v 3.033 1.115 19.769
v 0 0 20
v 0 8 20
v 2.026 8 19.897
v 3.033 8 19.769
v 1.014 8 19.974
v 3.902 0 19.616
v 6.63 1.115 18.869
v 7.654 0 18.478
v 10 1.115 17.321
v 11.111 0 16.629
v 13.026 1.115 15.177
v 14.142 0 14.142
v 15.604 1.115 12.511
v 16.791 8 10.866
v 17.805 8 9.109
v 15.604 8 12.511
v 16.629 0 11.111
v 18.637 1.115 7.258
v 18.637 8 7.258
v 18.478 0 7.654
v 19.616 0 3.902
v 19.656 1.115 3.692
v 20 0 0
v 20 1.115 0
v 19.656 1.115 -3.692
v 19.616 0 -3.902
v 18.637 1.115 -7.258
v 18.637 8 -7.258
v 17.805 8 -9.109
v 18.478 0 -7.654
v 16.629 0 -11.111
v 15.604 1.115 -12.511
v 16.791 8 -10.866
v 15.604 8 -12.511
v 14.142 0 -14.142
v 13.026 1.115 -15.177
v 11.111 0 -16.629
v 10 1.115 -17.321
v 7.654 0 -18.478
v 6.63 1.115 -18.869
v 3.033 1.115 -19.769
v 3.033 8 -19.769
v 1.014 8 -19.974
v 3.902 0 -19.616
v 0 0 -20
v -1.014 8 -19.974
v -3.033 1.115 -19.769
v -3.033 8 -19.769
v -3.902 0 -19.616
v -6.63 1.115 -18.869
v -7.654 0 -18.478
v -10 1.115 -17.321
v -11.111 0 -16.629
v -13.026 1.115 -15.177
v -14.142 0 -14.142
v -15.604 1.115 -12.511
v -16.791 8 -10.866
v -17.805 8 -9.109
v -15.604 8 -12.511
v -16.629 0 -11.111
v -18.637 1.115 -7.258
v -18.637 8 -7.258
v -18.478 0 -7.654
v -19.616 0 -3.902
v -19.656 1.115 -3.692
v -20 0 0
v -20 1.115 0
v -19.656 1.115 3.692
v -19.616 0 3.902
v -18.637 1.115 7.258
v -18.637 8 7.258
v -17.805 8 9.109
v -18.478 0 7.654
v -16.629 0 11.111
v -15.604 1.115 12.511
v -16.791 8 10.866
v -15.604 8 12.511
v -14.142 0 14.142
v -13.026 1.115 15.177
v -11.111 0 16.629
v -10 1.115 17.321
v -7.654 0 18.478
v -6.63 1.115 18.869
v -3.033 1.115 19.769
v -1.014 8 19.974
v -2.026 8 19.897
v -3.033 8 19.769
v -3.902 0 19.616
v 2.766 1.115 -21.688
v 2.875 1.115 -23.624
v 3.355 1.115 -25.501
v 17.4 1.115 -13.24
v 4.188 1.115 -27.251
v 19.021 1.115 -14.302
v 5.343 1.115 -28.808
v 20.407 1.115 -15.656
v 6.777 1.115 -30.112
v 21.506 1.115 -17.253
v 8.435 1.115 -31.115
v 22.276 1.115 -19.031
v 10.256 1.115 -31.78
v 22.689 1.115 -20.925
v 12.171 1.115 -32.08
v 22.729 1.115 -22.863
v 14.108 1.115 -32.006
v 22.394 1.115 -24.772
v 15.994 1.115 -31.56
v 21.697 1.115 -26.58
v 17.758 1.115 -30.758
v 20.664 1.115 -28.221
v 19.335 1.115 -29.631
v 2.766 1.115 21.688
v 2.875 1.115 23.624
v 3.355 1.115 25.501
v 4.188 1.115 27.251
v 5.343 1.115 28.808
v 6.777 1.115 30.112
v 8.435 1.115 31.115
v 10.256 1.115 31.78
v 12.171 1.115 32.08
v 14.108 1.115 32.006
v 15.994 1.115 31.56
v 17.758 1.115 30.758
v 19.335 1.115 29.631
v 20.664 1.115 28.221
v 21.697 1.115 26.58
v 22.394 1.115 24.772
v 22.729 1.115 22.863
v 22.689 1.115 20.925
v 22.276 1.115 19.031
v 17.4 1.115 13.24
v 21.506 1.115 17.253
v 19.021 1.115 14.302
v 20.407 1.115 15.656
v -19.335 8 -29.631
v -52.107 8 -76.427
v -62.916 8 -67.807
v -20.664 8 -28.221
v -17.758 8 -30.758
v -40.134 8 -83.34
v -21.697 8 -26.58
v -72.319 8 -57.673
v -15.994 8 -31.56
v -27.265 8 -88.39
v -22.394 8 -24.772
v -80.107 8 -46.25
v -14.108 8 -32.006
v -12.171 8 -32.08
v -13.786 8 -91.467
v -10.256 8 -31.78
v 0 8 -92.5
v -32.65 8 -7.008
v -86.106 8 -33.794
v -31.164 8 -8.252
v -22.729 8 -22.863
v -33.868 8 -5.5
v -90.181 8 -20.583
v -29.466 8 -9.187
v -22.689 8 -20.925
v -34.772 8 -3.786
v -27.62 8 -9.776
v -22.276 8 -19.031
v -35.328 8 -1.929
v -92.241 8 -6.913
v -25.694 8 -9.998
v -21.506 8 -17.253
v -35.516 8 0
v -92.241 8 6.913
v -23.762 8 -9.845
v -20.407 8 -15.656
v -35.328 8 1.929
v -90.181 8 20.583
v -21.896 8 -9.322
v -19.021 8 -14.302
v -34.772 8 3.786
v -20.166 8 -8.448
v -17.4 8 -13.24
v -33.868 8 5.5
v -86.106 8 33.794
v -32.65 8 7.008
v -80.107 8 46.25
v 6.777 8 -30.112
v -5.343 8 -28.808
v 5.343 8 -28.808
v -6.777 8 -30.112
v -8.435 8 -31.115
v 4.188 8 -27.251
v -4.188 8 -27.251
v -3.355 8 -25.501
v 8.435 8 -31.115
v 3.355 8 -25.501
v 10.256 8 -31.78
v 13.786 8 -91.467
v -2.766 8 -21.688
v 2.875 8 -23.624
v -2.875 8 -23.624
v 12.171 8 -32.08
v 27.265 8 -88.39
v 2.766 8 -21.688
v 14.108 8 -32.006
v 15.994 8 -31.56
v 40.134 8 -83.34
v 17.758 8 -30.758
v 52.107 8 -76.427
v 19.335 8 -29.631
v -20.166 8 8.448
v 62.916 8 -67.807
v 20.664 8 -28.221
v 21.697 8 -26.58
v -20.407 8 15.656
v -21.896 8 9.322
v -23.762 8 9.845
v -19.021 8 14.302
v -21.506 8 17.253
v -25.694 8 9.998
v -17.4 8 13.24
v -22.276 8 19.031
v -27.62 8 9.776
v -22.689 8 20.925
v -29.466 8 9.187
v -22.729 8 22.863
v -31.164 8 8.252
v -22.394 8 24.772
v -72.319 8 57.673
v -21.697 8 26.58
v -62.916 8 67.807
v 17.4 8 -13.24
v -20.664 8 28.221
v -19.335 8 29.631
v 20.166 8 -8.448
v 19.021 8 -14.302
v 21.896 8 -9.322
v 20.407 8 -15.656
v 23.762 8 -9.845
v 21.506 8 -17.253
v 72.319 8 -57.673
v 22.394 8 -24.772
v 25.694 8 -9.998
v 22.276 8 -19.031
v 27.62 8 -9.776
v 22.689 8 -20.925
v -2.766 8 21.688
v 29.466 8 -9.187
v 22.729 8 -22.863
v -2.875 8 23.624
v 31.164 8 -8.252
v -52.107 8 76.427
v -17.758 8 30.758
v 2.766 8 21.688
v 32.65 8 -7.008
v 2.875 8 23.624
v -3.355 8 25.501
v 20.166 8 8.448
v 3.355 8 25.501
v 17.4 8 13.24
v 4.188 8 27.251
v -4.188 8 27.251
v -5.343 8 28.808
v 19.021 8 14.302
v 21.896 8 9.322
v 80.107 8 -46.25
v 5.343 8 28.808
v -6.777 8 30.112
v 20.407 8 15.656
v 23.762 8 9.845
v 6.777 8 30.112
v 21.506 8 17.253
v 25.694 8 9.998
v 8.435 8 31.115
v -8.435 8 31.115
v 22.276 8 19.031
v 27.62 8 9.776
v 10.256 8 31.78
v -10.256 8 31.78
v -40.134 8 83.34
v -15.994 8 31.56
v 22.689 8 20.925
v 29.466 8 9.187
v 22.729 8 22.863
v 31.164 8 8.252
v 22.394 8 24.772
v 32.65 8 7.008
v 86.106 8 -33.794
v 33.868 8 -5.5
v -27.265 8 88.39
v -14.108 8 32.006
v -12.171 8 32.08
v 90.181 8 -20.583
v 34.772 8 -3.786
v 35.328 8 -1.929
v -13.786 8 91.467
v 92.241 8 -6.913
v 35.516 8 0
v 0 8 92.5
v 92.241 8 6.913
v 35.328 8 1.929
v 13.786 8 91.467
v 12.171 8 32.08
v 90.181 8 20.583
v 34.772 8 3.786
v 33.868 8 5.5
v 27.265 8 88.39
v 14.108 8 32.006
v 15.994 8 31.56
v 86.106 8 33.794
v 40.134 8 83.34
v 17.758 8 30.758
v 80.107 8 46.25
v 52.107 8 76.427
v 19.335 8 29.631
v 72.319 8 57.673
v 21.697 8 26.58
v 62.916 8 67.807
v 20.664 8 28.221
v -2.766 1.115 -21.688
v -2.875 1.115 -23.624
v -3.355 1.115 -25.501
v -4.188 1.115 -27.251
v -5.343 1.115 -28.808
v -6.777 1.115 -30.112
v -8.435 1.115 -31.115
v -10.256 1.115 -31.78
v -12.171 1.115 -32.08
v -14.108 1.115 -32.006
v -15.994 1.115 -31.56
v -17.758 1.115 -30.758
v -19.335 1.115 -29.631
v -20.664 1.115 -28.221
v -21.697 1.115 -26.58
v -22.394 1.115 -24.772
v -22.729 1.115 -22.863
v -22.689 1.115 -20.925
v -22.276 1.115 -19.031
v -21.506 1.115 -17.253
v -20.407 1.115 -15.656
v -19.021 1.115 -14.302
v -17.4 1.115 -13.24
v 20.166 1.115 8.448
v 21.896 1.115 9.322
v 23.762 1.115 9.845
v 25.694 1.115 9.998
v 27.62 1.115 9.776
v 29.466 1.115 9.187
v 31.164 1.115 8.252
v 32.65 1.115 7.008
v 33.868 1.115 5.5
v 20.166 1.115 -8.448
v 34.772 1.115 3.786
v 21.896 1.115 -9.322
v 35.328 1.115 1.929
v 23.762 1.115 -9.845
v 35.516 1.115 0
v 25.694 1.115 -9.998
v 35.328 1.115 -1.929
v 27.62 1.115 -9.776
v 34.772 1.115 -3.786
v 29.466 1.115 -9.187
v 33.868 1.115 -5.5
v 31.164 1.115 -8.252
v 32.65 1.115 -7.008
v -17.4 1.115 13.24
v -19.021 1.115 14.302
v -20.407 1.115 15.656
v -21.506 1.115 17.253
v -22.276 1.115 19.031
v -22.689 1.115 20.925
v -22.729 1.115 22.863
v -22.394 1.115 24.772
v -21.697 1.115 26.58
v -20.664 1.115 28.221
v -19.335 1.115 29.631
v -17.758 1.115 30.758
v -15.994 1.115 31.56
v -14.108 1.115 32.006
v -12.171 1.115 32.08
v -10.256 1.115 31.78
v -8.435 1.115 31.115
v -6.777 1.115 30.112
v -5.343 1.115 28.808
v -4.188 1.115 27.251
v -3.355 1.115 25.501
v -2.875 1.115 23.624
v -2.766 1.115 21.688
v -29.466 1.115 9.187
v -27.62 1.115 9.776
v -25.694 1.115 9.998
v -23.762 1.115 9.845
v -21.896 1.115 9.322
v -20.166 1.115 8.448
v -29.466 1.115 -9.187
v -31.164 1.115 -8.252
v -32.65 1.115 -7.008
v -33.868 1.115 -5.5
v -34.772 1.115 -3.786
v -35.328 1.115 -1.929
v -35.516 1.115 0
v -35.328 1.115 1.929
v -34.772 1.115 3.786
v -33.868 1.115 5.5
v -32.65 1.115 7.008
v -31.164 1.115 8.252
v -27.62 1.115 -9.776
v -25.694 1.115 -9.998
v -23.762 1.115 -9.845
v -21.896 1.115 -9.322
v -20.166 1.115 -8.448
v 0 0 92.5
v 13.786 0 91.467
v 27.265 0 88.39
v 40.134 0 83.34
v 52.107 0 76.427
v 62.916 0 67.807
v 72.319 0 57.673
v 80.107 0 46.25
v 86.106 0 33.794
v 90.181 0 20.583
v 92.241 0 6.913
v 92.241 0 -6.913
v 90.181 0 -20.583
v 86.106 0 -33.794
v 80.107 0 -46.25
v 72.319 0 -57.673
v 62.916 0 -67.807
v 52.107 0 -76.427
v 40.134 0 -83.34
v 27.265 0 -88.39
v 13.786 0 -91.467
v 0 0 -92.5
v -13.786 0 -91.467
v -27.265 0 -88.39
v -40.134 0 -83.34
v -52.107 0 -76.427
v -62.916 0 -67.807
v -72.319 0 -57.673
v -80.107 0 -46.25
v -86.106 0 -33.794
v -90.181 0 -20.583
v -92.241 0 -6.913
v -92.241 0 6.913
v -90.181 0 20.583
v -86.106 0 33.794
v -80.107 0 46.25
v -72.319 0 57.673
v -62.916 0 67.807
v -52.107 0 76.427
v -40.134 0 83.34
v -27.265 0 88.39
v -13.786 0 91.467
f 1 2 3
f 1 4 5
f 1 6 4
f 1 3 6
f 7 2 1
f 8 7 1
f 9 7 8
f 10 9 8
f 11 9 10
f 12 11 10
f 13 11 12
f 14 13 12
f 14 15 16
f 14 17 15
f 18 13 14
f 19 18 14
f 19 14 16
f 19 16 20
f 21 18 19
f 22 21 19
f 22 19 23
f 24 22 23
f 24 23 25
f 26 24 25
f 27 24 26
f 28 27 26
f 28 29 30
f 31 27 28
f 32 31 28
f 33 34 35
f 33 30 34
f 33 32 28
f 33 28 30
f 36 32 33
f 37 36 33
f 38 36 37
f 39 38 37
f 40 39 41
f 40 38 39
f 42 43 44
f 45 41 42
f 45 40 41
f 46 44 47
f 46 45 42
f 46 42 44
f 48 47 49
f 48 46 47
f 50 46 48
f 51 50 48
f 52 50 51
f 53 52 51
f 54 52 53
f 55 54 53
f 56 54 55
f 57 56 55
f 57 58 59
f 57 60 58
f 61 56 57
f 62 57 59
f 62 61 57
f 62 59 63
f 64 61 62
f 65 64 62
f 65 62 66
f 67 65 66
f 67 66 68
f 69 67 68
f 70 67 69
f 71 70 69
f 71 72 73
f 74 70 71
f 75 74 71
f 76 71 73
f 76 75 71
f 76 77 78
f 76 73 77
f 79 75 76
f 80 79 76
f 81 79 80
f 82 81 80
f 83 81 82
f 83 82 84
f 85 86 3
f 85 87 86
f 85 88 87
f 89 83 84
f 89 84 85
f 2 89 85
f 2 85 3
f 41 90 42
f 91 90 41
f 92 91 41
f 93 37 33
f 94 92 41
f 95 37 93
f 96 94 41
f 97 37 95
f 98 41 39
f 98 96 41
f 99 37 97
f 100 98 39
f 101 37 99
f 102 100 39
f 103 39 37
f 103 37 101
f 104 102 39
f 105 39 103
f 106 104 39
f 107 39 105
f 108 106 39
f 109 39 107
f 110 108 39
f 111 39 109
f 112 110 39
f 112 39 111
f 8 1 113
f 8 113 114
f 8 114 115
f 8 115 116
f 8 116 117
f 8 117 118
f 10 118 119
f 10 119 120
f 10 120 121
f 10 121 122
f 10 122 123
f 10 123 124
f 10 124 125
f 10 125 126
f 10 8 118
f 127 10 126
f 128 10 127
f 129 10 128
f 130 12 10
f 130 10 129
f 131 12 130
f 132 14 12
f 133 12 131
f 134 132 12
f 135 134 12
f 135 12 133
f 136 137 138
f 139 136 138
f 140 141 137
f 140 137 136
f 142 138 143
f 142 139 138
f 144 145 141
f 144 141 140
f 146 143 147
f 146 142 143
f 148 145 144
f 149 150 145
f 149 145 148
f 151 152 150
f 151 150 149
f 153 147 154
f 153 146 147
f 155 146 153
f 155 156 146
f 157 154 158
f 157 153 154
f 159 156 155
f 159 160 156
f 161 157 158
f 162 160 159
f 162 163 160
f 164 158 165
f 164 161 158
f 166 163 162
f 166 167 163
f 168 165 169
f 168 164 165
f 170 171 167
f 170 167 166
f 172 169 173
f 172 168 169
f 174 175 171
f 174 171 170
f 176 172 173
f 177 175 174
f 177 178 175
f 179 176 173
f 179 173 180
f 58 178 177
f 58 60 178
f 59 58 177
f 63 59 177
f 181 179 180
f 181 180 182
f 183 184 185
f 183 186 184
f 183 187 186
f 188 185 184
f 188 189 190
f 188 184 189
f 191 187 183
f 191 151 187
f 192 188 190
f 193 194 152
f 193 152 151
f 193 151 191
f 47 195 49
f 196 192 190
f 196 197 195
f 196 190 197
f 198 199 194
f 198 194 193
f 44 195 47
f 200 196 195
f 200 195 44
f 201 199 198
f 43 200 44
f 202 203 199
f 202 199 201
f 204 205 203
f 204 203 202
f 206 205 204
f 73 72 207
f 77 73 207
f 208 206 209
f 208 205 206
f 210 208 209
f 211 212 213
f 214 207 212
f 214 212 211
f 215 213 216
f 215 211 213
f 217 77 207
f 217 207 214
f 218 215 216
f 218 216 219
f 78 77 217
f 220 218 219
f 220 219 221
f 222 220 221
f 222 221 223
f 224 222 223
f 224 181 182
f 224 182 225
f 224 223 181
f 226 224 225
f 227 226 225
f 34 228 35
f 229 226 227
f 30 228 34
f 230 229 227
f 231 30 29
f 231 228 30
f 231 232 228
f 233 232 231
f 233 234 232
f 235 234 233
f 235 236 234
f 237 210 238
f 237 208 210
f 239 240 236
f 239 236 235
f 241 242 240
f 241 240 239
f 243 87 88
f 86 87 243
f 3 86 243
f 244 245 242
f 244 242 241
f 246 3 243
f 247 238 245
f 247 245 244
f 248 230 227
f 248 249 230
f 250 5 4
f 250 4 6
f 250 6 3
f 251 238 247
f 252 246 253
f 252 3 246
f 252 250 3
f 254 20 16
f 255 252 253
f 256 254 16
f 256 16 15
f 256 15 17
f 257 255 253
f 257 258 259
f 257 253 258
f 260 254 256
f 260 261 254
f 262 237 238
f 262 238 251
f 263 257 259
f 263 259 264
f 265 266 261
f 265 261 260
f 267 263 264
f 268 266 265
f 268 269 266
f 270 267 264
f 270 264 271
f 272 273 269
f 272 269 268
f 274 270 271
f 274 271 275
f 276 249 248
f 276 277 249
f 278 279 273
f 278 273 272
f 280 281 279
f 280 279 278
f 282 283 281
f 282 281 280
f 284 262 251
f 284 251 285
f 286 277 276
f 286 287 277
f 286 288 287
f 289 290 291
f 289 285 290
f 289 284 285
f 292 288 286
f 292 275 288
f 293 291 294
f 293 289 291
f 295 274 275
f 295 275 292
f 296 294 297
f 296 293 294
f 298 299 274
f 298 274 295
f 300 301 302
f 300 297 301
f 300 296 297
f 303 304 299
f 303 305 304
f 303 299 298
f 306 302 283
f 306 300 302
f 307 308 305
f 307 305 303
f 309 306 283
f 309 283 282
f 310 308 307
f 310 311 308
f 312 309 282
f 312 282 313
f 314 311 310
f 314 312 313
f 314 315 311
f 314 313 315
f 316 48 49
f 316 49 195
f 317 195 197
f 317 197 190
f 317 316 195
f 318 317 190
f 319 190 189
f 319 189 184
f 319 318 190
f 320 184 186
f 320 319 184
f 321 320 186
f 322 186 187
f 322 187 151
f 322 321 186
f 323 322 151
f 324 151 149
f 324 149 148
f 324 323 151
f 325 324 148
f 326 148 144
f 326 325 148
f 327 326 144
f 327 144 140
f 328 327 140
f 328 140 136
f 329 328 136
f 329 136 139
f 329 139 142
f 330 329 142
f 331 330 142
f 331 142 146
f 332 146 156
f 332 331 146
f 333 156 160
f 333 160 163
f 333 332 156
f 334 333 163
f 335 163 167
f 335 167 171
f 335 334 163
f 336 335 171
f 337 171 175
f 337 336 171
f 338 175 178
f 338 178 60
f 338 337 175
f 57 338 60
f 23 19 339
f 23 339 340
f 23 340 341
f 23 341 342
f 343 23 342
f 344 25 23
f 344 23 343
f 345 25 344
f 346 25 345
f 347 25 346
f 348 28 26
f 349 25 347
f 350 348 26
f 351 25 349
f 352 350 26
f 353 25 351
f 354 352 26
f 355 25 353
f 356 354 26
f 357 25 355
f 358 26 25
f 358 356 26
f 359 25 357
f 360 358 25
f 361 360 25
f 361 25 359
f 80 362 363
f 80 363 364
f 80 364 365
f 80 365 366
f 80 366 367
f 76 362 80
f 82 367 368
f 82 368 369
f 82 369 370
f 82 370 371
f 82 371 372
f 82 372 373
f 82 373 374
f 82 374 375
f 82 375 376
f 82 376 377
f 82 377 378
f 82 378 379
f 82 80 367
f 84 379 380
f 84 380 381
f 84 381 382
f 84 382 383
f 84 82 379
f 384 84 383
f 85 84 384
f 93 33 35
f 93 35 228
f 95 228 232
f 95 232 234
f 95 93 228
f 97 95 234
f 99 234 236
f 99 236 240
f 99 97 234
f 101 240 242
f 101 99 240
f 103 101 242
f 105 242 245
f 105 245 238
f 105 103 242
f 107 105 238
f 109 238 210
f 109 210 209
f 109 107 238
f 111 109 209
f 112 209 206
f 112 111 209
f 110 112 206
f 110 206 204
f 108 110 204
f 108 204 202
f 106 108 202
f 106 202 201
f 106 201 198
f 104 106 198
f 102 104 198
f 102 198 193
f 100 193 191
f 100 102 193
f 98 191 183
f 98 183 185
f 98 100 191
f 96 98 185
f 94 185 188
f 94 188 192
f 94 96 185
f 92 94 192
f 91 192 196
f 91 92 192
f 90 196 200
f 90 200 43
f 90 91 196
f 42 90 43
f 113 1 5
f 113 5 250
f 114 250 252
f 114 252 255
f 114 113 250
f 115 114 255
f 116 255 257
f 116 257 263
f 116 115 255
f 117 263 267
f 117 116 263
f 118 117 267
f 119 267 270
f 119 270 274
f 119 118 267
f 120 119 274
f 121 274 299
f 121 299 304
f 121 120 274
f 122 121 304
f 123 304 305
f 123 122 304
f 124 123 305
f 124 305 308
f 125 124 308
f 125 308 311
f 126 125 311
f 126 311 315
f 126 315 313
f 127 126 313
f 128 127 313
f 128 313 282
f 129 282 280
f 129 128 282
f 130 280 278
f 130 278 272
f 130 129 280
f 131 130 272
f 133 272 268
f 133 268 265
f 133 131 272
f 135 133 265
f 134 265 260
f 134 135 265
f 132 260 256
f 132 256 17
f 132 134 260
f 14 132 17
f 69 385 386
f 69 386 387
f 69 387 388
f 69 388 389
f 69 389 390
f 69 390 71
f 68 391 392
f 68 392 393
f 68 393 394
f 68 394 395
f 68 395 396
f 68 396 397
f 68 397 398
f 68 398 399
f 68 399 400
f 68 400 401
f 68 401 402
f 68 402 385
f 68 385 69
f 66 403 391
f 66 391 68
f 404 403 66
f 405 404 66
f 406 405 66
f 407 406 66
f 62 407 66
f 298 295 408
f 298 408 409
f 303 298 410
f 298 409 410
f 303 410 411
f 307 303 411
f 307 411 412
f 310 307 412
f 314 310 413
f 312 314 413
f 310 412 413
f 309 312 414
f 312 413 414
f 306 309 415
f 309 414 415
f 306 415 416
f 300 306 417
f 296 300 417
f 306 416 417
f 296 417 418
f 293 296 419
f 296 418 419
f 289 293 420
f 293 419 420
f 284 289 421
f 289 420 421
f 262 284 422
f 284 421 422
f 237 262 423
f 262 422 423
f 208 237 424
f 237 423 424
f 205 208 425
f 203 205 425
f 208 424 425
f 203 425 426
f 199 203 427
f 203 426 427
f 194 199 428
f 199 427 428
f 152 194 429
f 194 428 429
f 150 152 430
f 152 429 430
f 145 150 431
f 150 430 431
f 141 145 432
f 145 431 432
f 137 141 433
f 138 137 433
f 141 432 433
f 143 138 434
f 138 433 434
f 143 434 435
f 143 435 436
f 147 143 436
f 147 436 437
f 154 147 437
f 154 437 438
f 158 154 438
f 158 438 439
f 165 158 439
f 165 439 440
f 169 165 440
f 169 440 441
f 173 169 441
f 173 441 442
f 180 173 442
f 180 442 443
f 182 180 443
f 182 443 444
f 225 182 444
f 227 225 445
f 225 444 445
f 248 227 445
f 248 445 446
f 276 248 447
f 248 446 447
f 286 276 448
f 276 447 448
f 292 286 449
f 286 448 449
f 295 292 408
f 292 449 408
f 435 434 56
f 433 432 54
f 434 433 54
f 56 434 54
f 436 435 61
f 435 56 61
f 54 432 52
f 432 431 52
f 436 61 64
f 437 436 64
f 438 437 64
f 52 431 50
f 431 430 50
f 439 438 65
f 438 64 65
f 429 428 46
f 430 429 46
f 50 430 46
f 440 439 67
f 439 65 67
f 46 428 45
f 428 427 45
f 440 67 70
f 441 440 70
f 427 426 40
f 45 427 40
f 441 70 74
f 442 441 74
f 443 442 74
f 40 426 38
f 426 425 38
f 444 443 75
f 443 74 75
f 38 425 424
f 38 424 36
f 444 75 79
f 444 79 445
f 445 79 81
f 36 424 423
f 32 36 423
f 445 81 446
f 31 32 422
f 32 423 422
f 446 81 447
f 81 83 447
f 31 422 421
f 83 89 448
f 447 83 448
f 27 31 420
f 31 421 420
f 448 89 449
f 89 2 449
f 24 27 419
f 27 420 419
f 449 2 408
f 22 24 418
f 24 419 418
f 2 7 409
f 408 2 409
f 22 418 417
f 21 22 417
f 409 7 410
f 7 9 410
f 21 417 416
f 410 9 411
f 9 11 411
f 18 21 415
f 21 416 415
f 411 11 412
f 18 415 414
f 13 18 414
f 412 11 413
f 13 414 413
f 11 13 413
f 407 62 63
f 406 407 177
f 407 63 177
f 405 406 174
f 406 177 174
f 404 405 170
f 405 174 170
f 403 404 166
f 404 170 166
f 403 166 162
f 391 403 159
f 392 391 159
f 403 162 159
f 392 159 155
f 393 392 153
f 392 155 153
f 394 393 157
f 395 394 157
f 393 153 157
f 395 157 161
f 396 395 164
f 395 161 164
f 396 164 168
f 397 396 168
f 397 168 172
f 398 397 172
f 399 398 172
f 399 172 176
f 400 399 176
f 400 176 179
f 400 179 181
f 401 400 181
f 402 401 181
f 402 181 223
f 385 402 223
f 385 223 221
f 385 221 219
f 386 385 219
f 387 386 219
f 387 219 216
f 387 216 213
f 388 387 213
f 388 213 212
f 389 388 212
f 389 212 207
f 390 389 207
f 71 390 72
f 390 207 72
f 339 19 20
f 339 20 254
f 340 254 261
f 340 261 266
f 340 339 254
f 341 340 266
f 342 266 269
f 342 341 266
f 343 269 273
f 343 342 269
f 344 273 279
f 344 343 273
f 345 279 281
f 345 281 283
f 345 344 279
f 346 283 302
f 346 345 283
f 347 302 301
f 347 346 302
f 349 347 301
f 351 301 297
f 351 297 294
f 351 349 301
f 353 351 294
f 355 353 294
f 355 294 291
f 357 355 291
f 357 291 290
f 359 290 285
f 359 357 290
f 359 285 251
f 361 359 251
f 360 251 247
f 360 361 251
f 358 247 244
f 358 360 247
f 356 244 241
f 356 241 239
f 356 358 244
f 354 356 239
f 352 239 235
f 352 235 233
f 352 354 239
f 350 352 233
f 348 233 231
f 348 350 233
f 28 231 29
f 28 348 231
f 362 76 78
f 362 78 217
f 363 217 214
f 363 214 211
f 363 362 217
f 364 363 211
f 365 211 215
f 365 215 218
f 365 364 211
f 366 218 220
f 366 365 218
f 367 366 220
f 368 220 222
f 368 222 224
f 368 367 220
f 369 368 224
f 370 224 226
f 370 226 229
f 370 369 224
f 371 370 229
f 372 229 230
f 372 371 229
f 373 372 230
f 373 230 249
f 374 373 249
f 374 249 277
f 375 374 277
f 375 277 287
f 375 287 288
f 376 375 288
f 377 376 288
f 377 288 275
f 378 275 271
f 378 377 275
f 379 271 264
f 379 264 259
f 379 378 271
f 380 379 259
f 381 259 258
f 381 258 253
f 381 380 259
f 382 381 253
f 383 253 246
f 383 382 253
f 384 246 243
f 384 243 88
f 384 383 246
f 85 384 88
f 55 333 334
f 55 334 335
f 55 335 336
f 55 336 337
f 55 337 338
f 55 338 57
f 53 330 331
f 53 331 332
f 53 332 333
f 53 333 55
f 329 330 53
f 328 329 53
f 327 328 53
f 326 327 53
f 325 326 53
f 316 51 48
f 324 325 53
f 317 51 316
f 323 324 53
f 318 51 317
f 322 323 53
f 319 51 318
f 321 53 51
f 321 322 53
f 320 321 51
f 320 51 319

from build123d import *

# Parameters (mm, degrees)
SKETCH1_R           = 92.5
BOSS_EXTRUDE1_DEPTH = 8
SKETCH2_R           = 20
CUT_EXTRUDE1_DEPTH  = 132.059146953
SKETCH3_R           = 10
CUT_EXTRUDE2_DEPTH  = 6.885447698
CIRPATTERN1_COUNT   = 6


with BuildPart() as part:
    # Sketch1 → Boss-Extrude1 (new body)
    with BuildSketch(Plane(origin=(0, 0, 0), x_dir=(1, 0, 0), z_dir=(0, 1, 0))):
        Circle(SKETCH1_R)
    extrude(amount=BOSS_EXTRUDE1_DEPTH)

    # Sketch2 → Cut-Extrude1 (cut, through all)
    with BuildSketch(Plane(origin=(0, 0, 0), x_dir=(1, 0, 0), z_dir=(0, 1, 0))):
        Circle(SKETCH2_R)
    extrude(amount=CUT_EXTRUDE1_DEPTH, mode=Mode.SUBTRACT)

    # Sketch3 → Cut-Extrude2 (cut)
    with BuildSketch(Plane(origin=(0, 8, 0), x_dir=(1, 0, 0), z_dir=(0, 1, 0))):
        with Locations((-25.516109786, 0)):
            Circle(SKETCH3_R)
    cut_extrude2 = extrude(amount=-CUT_EXTRUDE2_DEPTH, mode=Mode.SUBTRACT)

    # CirPattern1: Cut-Extrude2 ×6 about axis
    cirpattern1_axis = Axis((0, 0, 0), (0, 1, 0))
    for i in range(1, CIRPATTERN1_COUNT):
        add(cut_extrude2.rotate(cirpattern1_axis, i * 360 / CIRPATTERN1_COUNT), mode=Mode.SUBTRACT)


solid = part.part
